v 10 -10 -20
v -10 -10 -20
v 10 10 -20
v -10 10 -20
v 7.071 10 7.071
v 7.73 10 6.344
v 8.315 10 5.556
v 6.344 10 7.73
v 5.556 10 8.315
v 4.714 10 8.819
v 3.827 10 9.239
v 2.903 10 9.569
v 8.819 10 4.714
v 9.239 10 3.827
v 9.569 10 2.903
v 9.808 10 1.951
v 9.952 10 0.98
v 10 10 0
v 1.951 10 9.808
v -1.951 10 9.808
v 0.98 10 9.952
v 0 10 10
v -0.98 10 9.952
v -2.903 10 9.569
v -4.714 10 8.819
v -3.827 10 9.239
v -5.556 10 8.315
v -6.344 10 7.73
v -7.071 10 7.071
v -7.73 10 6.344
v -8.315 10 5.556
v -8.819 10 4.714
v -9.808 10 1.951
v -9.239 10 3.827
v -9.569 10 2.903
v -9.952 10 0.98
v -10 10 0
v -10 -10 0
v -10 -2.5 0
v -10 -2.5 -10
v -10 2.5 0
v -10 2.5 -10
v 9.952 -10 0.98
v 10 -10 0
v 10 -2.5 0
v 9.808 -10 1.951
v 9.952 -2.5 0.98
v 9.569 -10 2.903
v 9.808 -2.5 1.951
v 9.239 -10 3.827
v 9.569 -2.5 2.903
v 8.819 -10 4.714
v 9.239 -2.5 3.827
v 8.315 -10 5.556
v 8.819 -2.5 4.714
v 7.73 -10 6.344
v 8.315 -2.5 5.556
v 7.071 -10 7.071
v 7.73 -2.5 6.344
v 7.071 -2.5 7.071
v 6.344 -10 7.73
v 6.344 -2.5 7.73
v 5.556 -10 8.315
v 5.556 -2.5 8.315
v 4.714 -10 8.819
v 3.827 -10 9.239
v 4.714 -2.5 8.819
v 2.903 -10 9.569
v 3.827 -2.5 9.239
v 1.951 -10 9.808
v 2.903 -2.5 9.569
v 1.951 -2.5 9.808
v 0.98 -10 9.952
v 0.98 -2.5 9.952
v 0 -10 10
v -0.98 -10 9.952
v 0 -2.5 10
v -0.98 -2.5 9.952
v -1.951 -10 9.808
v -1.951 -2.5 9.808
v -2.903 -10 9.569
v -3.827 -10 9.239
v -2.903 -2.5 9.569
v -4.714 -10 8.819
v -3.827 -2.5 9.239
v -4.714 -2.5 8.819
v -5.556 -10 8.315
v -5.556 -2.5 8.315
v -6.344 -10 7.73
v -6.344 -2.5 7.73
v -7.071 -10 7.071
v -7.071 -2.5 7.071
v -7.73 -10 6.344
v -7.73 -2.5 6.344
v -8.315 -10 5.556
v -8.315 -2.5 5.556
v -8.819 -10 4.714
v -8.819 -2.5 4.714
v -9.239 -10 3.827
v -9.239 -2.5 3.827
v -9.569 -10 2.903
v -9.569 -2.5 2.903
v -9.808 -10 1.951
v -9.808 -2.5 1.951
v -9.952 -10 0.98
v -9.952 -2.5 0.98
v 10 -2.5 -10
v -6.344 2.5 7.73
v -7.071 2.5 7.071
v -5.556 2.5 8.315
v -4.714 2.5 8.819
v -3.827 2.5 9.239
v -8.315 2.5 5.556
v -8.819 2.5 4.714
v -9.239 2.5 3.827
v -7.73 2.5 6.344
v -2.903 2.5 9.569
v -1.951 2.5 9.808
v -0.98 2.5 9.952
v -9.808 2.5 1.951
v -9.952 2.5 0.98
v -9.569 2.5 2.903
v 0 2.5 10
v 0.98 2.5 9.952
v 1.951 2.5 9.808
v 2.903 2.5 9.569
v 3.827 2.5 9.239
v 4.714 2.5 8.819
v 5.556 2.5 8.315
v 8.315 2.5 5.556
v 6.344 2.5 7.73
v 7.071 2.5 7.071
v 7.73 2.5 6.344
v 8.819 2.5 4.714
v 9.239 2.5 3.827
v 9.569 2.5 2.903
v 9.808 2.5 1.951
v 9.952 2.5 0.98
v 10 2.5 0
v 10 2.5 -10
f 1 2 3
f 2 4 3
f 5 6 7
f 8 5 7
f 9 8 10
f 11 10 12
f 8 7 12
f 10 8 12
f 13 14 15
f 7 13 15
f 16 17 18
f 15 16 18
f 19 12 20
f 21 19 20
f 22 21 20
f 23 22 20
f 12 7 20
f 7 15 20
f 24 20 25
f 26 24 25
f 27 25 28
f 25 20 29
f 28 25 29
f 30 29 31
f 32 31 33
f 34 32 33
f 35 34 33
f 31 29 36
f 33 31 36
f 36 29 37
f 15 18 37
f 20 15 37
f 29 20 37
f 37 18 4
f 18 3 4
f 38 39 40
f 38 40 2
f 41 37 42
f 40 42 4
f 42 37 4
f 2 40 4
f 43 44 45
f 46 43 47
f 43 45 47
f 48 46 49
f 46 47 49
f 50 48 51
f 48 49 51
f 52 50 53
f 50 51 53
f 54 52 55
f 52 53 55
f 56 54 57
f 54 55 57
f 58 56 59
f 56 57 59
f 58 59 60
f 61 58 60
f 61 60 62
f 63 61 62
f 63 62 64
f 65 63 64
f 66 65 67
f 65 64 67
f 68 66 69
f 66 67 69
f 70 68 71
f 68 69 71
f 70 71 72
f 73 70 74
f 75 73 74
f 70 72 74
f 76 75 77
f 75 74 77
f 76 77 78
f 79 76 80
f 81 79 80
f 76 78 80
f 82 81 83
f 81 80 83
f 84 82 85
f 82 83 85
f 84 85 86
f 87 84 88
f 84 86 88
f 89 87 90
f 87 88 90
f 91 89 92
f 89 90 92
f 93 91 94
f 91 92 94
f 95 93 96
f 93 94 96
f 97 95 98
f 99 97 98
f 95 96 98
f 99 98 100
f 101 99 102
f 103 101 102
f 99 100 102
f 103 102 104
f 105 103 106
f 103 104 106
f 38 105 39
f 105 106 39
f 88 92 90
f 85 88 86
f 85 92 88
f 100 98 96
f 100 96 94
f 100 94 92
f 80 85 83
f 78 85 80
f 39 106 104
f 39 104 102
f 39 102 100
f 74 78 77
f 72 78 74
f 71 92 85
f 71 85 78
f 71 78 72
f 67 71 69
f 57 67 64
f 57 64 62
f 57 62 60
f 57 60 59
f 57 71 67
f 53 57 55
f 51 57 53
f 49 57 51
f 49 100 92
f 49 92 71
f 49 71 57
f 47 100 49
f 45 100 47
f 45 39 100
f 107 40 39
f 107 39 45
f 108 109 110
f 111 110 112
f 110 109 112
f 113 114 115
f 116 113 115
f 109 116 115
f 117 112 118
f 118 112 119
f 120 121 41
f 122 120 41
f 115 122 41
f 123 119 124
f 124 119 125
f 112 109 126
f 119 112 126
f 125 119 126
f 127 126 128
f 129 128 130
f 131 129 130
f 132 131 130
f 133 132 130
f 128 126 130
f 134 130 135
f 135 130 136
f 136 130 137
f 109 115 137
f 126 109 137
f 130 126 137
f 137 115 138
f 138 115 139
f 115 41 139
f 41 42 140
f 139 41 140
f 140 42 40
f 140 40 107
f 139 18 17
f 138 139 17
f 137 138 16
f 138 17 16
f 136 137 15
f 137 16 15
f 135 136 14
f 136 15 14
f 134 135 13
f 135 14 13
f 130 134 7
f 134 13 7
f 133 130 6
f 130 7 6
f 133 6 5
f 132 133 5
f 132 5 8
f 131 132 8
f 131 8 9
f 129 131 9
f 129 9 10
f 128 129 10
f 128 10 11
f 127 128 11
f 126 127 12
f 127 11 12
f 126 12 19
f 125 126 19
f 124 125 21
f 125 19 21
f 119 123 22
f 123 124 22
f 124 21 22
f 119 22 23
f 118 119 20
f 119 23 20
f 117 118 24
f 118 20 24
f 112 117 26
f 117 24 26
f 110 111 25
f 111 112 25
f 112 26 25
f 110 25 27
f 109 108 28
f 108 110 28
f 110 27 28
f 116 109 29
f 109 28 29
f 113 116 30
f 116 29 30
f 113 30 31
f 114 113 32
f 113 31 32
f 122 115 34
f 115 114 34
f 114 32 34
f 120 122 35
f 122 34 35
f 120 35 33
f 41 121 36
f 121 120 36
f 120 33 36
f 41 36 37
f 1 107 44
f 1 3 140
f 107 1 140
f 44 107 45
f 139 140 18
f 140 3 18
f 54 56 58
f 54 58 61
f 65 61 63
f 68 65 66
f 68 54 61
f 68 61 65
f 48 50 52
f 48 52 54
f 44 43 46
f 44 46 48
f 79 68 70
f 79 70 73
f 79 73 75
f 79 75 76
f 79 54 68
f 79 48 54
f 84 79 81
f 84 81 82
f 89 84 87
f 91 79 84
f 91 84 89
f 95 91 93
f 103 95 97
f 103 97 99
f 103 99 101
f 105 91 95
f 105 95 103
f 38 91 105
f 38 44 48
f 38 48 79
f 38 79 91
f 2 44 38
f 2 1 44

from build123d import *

# Parameters (mm, degrees)
AUFSATZ_LINEAR_AUSTRAGEN1_DEPTH      = 10
SCHNITT_LINEAR_AUSTRAGEN1_DEPTH      = 25.494897428
SCHNITT_LINEAR_AUSTRAGEN1_DEPTH_BACK = 10
SKIZZE2_W                            = 20
SKIZZE2_H                            = 5


with BuildPart() as part:
    # Skizze1 → Aufsatz-Linear austragen1 (new, symmetric)
    with BuildSketch(Plane(origin=(0, 0, 0), x_dir=(1, 0, 0), z_dir=(0, 1, 0))):
        with BuildLine():
            Line((-10, 0), (-10, 20))
            Line((-10, 20), (10, 20))
            Line((10, 20), (10, 0))
            ThreePointArc((10, 0), (0, -10), (-10, 0))
        make_face()
    extrude(amount=AUFSATZ_LINEAR_AUSTRAGEN1_DEPTH, both=True)

    # Skizze2 → Schnitt-Linear austragen1 (cut, two sides: drawn at the far end of the back side and taken through both)
    with BuildSketch(Plane.XY.offset(-SCHNITT_LINEAR_AUSTRAGEN1_DEPTH_BACK)):
        Rectangle(SKIZZE2_W, SKIZZE2_H)
    extrude(amount=SCHNITT_LINEAR_AUSTRAGEN1_DEPTH + SCHNITT_LINEAR_AUSTRAGEN1_DEPTH_BACK, mode=Mode.SUBTRACT)


solid = part.part
